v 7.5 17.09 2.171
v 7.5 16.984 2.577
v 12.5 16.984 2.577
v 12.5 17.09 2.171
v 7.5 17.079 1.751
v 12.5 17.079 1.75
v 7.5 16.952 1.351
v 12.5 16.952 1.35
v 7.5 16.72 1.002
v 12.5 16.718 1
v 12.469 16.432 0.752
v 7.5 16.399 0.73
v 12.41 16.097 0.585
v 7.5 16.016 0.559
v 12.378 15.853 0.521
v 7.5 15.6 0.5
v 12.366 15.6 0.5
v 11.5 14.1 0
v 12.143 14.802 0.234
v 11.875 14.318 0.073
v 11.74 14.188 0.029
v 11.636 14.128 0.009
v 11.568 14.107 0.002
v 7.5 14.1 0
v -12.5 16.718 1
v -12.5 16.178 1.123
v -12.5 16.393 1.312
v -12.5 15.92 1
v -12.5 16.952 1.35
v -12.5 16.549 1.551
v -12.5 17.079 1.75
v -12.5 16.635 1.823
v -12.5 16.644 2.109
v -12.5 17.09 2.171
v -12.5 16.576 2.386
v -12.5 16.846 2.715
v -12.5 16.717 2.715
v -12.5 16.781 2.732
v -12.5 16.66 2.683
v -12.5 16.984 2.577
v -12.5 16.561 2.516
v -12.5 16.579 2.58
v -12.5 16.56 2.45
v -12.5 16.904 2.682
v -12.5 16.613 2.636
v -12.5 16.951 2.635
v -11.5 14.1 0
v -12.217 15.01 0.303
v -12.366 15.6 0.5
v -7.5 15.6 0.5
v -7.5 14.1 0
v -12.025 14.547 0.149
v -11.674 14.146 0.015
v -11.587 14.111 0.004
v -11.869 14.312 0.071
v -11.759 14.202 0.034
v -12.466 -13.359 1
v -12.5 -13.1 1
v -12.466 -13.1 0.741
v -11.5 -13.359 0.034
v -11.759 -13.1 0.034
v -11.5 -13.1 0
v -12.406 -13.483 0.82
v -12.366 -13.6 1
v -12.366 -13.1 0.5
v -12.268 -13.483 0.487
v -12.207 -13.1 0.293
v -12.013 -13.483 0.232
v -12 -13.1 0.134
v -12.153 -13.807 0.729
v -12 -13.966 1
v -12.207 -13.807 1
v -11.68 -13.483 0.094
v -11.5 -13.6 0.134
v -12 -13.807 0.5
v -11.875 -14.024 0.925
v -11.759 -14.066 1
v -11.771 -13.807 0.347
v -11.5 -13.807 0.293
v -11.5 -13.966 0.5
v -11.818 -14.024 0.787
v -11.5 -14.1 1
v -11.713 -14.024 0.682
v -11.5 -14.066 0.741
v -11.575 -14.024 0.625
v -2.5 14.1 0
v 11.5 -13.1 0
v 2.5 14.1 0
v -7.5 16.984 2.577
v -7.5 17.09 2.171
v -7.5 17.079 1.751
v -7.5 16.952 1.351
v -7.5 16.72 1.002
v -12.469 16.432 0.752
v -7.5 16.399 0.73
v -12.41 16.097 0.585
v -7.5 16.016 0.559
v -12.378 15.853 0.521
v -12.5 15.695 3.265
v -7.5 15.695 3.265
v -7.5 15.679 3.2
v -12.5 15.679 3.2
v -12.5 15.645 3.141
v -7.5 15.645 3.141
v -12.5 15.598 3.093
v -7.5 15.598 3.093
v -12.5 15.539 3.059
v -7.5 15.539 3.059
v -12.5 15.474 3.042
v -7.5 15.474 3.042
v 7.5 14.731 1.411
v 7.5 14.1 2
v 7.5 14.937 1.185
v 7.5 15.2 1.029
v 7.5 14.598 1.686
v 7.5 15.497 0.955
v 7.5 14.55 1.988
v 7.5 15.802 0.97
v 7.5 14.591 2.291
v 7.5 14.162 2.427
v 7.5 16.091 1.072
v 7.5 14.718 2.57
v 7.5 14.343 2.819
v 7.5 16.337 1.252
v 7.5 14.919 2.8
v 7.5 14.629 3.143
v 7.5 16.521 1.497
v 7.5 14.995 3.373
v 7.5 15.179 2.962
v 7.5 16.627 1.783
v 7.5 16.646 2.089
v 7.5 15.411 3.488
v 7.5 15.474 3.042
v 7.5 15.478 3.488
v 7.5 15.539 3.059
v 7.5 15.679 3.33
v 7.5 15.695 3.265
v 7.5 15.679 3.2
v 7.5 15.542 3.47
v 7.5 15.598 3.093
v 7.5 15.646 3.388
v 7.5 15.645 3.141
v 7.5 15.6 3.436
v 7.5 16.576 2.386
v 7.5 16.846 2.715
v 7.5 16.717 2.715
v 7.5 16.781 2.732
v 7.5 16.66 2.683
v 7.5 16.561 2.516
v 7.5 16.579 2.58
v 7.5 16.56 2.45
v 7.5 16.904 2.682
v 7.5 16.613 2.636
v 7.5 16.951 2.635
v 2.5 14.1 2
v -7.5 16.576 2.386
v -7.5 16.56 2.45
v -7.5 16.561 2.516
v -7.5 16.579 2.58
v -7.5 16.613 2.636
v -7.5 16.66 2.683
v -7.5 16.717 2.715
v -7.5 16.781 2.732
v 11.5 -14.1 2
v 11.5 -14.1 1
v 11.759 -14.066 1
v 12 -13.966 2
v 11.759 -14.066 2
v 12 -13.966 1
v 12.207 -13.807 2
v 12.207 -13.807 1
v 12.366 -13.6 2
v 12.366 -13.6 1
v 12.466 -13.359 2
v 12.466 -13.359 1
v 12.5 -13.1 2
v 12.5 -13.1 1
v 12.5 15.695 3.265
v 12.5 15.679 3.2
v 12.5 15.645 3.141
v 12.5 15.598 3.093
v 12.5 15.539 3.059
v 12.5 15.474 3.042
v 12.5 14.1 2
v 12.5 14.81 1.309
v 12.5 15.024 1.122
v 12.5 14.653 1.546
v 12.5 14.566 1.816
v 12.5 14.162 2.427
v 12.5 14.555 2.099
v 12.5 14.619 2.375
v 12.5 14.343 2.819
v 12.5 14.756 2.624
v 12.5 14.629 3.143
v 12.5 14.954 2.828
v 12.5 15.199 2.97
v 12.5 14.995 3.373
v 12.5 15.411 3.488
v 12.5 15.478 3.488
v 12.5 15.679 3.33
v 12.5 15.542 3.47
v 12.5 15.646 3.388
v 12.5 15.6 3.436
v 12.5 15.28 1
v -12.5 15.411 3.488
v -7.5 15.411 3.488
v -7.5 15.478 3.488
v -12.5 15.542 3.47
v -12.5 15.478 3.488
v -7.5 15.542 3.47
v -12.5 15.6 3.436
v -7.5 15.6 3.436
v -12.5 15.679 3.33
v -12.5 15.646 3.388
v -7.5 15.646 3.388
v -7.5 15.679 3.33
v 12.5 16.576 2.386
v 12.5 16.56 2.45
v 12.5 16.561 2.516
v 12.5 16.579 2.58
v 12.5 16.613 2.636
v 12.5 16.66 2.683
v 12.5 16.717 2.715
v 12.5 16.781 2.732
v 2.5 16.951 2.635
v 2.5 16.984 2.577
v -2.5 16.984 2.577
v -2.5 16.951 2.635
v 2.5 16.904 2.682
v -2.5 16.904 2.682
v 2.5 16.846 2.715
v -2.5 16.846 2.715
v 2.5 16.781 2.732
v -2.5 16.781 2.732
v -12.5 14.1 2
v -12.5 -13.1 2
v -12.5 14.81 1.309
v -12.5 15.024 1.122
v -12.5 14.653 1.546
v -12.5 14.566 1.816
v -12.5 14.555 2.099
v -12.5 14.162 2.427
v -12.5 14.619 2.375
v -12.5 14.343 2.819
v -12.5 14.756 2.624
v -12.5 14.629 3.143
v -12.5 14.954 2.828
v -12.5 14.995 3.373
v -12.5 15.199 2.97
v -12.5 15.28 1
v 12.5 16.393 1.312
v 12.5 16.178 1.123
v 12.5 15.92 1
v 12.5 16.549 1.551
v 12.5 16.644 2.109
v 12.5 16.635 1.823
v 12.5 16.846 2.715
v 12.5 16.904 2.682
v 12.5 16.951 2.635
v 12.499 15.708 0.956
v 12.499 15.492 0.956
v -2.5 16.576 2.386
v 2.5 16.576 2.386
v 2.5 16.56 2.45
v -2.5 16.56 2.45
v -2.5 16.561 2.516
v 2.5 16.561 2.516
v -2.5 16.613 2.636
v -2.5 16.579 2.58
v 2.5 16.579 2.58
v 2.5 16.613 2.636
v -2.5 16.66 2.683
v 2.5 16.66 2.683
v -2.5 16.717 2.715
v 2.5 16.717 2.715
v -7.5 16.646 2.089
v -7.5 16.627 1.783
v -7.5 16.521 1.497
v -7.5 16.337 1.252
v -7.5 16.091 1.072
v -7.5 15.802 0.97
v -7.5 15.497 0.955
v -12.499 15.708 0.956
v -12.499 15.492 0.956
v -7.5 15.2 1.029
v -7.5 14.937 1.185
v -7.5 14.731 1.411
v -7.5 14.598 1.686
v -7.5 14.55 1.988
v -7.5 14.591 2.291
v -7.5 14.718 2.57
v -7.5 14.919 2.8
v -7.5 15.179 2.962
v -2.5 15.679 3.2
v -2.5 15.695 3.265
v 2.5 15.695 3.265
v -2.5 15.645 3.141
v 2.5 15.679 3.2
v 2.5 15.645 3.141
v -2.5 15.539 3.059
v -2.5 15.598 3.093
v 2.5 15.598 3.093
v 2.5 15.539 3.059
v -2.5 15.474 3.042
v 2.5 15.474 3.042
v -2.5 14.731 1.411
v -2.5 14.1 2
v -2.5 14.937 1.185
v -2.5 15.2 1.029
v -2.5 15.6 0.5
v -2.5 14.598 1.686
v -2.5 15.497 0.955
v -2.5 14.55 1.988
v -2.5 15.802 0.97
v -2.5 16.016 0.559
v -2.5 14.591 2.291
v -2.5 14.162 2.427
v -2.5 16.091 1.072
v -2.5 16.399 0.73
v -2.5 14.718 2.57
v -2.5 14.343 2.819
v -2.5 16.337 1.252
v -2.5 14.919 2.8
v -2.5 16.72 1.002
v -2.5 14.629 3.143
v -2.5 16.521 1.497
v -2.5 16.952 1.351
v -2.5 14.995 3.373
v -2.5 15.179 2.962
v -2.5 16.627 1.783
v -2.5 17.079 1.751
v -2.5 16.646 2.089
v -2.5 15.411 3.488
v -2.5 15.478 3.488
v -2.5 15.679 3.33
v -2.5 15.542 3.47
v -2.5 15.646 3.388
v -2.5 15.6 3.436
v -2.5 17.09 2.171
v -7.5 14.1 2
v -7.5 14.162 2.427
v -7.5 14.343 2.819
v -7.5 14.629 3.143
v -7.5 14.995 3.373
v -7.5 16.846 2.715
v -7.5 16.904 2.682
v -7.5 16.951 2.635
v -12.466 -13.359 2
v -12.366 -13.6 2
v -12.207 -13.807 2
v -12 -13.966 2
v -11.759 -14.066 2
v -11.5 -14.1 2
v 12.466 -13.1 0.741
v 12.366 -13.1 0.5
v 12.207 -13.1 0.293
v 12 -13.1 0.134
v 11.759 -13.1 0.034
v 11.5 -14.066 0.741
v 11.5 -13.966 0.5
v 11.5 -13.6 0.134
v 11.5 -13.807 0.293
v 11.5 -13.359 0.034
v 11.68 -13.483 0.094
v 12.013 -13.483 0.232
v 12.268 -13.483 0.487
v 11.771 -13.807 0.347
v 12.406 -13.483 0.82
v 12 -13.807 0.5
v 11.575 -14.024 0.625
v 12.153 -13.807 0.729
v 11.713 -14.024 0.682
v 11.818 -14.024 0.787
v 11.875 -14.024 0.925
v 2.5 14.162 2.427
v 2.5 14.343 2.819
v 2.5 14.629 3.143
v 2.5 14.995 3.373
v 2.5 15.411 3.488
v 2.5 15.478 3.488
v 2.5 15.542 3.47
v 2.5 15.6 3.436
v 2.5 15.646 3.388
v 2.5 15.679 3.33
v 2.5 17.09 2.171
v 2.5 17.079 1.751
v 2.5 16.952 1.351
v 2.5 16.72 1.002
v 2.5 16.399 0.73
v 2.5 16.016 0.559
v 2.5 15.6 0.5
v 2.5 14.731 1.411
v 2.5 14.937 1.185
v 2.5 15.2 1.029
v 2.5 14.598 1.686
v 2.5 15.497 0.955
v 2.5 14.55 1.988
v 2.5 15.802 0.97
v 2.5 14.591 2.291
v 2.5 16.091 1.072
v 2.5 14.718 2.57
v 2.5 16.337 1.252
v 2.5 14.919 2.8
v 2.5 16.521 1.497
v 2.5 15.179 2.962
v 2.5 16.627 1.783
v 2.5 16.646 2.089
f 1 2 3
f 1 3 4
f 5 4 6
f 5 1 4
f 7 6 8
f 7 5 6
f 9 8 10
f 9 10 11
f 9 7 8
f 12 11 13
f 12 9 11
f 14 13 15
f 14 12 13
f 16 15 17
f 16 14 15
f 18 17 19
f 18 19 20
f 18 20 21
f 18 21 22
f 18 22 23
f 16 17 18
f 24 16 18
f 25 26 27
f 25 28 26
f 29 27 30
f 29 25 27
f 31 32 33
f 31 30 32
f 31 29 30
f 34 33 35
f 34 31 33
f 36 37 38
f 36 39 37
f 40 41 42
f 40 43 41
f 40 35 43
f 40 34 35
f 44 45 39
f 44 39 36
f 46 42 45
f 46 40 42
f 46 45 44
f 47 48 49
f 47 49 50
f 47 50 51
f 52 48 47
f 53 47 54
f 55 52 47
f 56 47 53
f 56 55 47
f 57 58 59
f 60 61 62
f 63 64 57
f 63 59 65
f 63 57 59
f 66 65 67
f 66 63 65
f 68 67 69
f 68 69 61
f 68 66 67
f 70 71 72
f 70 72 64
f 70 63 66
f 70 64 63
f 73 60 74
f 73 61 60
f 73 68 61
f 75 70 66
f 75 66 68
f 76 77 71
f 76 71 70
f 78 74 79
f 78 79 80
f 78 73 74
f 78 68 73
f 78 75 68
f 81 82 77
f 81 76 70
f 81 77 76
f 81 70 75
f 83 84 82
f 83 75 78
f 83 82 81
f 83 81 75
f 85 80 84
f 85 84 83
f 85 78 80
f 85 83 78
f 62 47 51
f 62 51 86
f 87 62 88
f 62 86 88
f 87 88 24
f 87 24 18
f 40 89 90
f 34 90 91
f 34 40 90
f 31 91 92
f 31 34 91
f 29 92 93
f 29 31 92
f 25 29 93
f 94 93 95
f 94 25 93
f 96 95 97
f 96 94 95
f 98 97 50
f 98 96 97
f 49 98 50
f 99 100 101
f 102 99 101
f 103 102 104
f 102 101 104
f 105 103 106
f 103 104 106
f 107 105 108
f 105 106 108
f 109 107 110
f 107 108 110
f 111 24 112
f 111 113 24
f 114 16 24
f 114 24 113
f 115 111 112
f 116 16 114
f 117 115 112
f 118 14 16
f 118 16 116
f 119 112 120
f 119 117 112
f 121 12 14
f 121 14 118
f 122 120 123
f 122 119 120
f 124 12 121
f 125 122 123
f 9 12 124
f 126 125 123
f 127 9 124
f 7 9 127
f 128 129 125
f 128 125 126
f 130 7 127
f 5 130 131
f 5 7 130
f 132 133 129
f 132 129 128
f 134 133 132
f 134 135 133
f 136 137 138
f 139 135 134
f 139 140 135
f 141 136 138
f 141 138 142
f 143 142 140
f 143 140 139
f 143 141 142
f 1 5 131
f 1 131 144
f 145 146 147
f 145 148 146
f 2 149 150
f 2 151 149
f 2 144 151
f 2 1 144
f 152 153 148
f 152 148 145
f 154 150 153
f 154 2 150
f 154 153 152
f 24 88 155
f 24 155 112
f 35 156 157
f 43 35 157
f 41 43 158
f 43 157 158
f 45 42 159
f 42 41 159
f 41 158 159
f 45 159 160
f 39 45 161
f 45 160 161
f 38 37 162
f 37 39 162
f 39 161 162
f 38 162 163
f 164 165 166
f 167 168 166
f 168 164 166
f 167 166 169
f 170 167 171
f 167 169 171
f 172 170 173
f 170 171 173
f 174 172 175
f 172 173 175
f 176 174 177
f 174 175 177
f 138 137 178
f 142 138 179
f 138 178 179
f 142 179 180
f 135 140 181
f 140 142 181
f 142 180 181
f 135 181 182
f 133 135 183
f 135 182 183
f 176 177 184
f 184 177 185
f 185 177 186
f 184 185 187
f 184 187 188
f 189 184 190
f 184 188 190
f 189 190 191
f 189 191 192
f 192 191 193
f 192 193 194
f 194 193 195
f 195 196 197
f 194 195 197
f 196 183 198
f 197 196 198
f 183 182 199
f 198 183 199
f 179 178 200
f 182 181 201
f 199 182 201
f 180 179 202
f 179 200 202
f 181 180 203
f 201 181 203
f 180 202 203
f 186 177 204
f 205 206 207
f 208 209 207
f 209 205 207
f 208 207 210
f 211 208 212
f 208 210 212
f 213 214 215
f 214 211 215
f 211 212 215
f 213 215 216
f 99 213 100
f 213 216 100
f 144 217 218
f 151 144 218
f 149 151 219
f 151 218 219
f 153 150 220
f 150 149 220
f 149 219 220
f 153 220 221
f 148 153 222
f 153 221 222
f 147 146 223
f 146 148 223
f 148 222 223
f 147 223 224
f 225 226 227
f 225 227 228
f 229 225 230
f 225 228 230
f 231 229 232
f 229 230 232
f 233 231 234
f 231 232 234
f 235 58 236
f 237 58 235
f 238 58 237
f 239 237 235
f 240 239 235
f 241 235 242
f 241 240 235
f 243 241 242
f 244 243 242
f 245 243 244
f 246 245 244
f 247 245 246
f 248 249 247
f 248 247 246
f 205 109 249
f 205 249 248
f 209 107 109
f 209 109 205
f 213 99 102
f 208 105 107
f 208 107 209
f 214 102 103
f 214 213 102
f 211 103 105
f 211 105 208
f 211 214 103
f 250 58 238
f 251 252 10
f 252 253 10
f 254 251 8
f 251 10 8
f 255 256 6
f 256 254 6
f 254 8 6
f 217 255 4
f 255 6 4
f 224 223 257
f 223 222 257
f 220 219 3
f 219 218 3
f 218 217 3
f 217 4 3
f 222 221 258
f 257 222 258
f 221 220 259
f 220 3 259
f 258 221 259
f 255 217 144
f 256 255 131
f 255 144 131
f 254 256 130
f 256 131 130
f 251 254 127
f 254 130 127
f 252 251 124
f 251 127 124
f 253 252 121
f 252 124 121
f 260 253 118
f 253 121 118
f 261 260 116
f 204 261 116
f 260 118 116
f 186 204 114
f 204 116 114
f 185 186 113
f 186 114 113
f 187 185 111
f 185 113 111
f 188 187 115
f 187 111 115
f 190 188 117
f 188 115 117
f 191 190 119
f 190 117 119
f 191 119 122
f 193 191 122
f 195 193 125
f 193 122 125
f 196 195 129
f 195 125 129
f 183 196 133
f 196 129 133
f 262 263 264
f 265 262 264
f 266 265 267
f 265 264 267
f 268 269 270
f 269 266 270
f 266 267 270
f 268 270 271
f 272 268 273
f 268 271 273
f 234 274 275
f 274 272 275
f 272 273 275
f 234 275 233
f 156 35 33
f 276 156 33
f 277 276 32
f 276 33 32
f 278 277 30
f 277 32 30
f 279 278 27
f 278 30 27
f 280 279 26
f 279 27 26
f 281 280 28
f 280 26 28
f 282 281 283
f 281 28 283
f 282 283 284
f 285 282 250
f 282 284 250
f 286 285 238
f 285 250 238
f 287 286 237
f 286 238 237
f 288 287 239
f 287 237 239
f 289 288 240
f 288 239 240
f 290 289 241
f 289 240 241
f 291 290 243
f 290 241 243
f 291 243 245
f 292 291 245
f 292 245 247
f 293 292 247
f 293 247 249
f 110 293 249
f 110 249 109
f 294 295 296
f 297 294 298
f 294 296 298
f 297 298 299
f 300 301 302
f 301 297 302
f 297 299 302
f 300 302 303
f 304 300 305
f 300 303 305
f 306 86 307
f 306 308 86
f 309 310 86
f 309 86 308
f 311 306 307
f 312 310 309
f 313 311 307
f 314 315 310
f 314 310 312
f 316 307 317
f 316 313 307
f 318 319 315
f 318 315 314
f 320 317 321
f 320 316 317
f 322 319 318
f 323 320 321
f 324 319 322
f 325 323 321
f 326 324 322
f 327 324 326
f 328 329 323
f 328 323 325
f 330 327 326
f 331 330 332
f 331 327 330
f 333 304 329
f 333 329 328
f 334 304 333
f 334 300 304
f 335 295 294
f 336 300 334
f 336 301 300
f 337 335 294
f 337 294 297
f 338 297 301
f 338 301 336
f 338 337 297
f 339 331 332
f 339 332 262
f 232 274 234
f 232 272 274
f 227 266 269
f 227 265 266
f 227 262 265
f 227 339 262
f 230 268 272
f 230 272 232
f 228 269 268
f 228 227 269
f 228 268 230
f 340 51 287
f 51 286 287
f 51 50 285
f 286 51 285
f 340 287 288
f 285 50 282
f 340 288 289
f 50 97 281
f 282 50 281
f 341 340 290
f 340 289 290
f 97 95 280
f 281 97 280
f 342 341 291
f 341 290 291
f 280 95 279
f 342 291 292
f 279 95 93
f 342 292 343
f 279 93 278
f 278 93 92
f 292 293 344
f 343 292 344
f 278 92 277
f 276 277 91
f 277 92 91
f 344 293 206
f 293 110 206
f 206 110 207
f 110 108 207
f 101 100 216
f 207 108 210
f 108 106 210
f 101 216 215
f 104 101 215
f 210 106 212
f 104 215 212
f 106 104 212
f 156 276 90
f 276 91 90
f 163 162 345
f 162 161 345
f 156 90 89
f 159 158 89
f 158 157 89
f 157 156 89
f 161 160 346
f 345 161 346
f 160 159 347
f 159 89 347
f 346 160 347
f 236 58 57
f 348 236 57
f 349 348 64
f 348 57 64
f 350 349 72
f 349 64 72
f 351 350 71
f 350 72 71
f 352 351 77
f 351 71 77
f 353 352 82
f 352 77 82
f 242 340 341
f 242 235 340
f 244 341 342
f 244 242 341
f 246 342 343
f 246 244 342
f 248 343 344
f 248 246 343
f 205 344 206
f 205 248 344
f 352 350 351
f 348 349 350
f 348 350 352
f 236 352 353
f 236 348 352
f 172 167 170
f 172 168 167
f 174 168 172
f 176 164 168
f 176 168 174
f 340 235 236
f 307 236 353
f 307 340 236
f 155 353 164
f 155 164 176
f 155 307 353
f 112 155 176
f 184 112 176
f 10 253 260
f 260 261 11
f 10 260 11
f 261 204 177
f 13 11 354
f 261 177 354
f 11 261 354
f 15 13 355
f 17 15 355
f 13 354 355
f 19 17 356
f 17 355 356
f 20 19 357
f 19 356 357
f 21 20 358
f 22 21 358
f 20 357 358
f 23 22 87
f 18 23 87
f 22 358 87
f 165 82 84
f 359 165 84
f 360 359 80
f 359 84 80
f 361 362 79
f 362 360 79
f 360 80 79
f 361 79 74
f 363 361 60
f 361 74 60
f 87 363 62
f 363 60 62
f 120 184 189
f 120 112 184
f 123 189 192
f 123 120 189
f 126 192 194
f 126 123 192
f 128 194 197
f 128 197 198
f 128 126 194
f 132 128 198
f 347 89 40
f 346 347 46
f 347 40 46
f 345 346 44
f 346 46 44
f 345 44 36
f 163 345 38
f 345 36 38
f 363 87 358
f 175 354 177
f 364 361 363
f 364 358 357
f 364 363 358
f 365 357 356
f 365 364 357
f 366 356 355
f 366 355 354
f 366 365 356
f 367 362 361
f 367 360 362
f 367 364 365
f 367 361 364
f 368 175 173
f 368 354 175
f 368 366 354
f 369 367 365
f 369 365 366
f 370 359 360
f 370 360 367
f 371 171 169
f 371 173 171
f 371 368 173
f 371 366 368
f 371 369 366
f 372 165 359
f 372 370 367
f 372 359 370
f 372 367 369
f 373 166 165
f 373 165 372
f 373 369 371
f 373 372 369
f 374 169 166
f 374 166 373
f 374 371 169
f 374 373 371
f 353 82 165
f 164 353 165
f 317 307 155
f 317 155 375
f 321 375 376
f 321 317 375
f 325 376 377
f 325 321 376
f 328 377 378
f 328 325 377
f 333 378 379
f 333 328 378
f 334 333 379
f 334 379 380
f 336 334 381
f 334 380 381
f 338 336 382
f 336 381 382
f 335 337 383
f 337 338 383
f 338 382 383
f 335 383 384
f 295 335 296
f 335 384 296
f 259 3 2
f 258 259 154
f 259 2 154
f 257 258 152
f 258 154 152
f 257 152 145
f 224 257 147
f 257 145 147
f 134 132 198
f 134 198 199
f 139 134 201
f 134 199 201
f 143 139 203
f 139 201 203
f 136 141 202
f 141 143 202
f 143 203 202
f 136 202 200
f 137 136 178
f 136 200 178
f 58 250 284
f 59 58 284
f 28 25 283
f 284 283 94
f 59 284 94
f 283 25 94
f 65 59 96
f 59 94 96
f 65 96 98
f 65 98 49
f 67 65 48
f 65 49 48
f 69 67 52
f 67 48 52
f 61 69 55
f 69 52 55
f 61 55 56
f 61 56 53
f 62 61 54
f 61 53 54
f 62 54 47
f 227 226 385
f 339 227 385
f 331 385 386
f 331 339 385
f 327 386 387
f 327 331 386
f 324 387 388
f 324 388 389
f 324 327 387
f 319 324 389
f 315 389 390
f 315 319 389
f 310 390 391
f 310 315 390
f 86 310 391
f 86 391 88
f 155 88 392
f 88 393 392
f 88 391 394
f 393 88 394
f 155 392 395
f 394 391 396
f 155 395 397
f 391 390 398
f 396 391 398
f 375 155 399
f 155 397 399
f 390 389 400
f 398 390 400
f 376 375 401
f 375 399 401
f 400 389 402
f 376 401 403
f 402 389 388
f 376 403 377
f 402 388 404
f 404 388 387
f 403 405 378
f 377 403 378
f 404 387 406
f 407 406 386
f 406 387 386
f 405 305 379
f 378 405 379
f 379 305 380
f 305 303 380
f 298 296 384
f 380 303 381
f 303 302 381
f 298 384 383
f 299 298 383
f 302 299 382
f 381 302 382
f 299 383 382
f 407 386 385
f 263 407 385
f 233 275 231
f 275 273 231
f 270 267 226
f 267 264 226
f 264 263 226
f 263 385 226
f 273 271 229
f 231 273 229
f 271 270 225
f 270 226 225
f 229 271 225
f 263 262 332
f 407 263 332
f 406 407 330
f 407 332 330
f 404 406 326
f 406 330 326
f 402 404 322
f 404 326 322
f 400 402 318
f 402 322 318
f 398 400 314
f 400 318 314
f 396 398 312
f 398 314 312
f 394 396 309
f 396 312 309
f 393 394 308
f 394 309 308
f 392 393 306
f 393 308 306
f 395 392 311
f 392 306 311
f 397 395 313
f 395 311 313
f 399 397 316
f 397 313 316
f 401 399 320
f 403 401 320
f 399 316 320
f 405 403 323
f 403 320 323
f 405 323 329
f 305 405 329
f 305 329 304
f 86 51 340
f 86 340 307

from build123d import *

# Parameters (mm, degrees)
SKETCH1_W           = 25
SKETCH1_H           = 28.2
BOSS_EXTRUDE1_DEPTH = 2
BOSS_EXTRUDE2_DEPTH = 5
LPATTERN1_COUNT     = 3
LPATTERN1_PITCH     = 10
SKETCH6_R           = 1.050000034
CUT_EXTRUDE1_DEPTH  = 31.490326335
FILLET1_R           = 1
FILLET2_R           = 1
SKETCH7_W           = 1.937328833
SKETCH7_H           = 1.211322367
CUT_EXTRUDE2_DEPTH  = 31.490326484
FILLET7_R           = 0.254


with BuildPart() as part:
    # Sketch1 → Boss-Extrude1 (new body)
    with BuildSketch(Plane.XY):
        Rectangle(SKETCH1_W, SKETCH1_H)
    extrude(amount=BOSS_EXTRUDE1_DEPTH)

    # Sketch5 → Boss-Extrude2 (add)
    with BuildSketch(Plane.ZY.offset(12.5)):
        with BuildLine():
            Line((0.5, 15.6), (0, 14.1))
            Line((0, 14.1), (2, 14.1))
            ThreePointArc((2, 14.1), (3.060660172, 16.660660172), (0.5, 15.6))
        make_face()
    boss_extrude2 = extrude(amount=-BOSS_EXTRUDE2_DEPTH)

    # LPattern1: Boss-Extrude2 ×3
    with Locations(*[(i * LPATTERN1_PITCH, 0, 0) for i in range(1, LPATTERN1_COUNT)]):
        add(boss_extrude2)

    # Sketch6 → Cut-Extrude1 (cut, through all)
    with BuildSketch(Plane.ZY.offset(12.5)):
        with Locations((2, 15.6)):
            Circle(SKETCH6_R)
    extrude(amount=-CUT_EXTRUDE1_DEPTH, mode=Mode.SUBTRACT)

    # Fillet1
    # the kernel refuses this fillet: 1 mm, written as the material it takes off along each edge
    with BuildSketch(Plane(origin=(12.5, -20.1, 0), x_dir=(0, 0, 1), z_dir=(0, 1, 0)), Plane(origin=(-12.5, 20.1, 0), x_dir=(0, 0, 1), z_dir=(0, -1, 0))) as fillet1_piece_1:
        with BuildLine():
            CenterArc((FILLET1_R, -FILLET1_R), FILLET1_R, 90, 90)
            Line((0, -FILLET1_R), (-FILLET1_R * 0.02, -FILLET1_R))
            Line((-FILLET1_R * 0.02, -FILLET1_R), (-FILLET1_R * 0.02, FILLET1_R * 0.02))
            Line((-FILLET1_R * 0.02, FILLET1_R * 0.02), (FILLET1_R, FILLET1_R * 0.02))
            Line((FILLET1_R, FILLET1_R * 0.02), (FILLET1_R, 0))
        make_face()
    extrude(amount=40.2, mode=Mode.SUBTRACT)
    with BuildSketch(Plane(origin=(-18.5, -14.1, 0), x_dir=(0, 0, 1), z_dir=(1, 0, 0))) as fillet1_piece_2:
        with BuildLine():
            CenterArc((FILLET1_R, -FILLET1_R), FILLET1_R, 90, 90)
            Line((0, -FILLET1_R), (-FILLET1_R * 0.02, -FILLET1_R))
            Line((-FILLET1_R * 0.02, -FILLET1_R), (-FILLET1_R * 0.02, FILLET1_R * 0.02))
            Line((-FILLET1_R * 0.02, FILLET1_R * 0.02), (FILLET1_R, FILLET1_R * 0.02))
            Line((FILLET1_R, FILLET1_R * 0.02), (FILLET1_R, 0))
        make_face()
    extrude(amount=37, mode=Mode.SUBTRACT)

    # Fillet2
    # the kernel refuses this fillet: 1 mm, written as the material it takes off along each edge
    with BuildSketch(Plane(origin=(-11.5, -13.1, 1), x_dir=(-1, 0, 0), z_dir=(0, -1, 0))) as fillet2_piece_1_section:
        Polygon((0, 0), (FILLET2_R, 0), (FILLET2_R, FILLET2_R), (0, FILLET2_R), align=None)
    fillet2_piece_1 = extrude(amount=FILLET2_R, mode=Mode.PRIVATE)
    fillet2_piece_1 = fillet2_piece_1 - Plane(origin=(-11.5, -13.1, 1), x_dir=(0.7071067811865475, 0, 0.7071067811865475), z_dir=(0, -1, 0)) * Sphere(FILLET2_R, mode=Mode.PRIVATE)
    add(fillet2_piece_1, mode=Mode.SUBTRACT)
    with BuildSketch(Plane(origin=(11.5, -13.1, 1), x_dir=(1, 0, 0), z_dir=(0, -1, 0))) as fillet2_piece_2_section:
        Polygon((0, 0), (FILLET2_R, 0), (FILLET2_R, -FILLET2_R), (0, -FILLET2_R), align=None)
    fillet2_piece_2 = extrude(amount=FILLET2_R, mode=Mode.PRIVATE)
    fillet2_piece_2 = fillet2_piece_2 - Plane(origin=(11.5, -13.1, 1), x_dir=(-0.7071067811865475, 0, 0.7071067811865475), z_dir=(0, -1, 0)) * Sphere(FILLET2_R, mode=Mode.PRIVATE)
    add(fillet2_piece_2, mode=Mode.SUBTRACT)
    with BuildSketch(Plane(origin=(12.5, -14.1, 1), x_dir=(-1, 0, 0), z_dir=(0, 0, 1))) as fillet2_piece_3:
        with BuildLine():
            CenterArc((FILLET2_R, -FILLET2_R), FILLET2_R, 90, 90)
            Line((0, -FILLET2_R), (0, 0))
            Line((0, 0), (FILLET2_R, 0))
        make_face()
    extrude(amount=3.5, mode=Mode.SUBTRACT)
    with BuildSketch(Plane(origin=(-12.5, -14.1, 1), x_dir=(1, 0, 0), z_dir=(0, 0, 1))) as fillet2_piece_4:
        with BuildLine():
            CenterArc((FILLET2_R, FILLET2_R), FILLET2_R, 180, 90)
            Line((0, FILLET2_R), (0, 0))
            Line((0, 0), (FILLET2_R, 0))
        make_face()
    extrude(amount=3.5, mode=Mode.SUBTRACT)

    # Sketch7 → Cut-Extrude2 (cut, through all)
    with BuildSketch(Plane.ZY.offset(12.5)):
        with Locations((3.702300239, 16.302688342)):
            Rectangle(SKETCH7_W, SKETCH7_H)
    extrude(amount=-CUT_EXTRUDE2_DEPTH, mode=Mode.SUBTRACT)

    # Fillet7
    # the kernel refuses this fillet: 0.254 mm, written as the material it takes off along each edge
    with BuildSketch(Plane(origin=(-6.784662672, 15.697027158, 3.496858621), x_dir=(0, -0.999525916105083, -0.03078868354273752), z_dir=(-1, 0, 0))) as fillet7_piece_1:
        with BuildLine():
            CenterArc((0.26190884, -0.252842039), FILLET7_R, 84.526905726, 97.237434721)
            Line((0.008029258, -0.260662364), (0, 0))
            ThreePointArc((0, 0), (0.143067466, 0.006838354), (0.286134931, 0))
        make_face()
    extrude(amount=6.430674656, mode=Mode.SUBTRACT)
    with BuildSketch(Plane(origin=(-6.877474788, 15.697027158, 3.045507437), x_dir=(0, 0, 1), z_dir=(-1, 0, 0))) as fillet7_piece_2:
        with BuildLine():
            CenterArc((0.249010085, -0.254), FILLET7_R, 90, 83.086084758)
            ThreePointArc((-0.003142862, -0.223424002), (0.004388728, -0.111795842), (0, 0))
            Line((0, 0), (0.249010085, 0))
        make_face()
    extrude(amount=6.245050424, mode=Mode.SUBTRACT)
    with BuildSketch(Plane(origin=(-6.34649613, 16.351184765, 2.733635822), x_dir=(0, 1, 0), z_dir=(-1, 0, 0)), Plane(origin=(13.65350387, 16.351184765, 2.733635822), x_dir=(0, 1, 0), z_dir=(-1, 0, 0)), Plane(origin=(3.65350387, 16.351184765, 2.733635822), x_dir=(0, 1, 0), z_dir=(-1, 0, 0))) as fillet7_piece_3:
        with BuildLine():
            CenterArc((0.461401548, 0.254), FILLET7_R, 158.418835743, 111.581164257)
            ThreePointArc((0.225207594, 0.347425994), (0.129898026, 0.162502575), (0, 0))
            Line((0, 0), (0.461401548, 0))
        make_face()
    extrude(amount=7.30700774, mode=Mode.SUBTRACT)
    with BuildSketch(Plane(origin=(-12.934394729, 16.908349525, 2.733635822), x_dir=(0, -1, 0), z_dir=(1, 0, 0)), Plane(origin=(7.065605271, 16.908349525, 2.733635822), x_dir=(0, -1, 0), z_dir=(1, 0, 0)), Plane(origin=(-2.934394729, 16.908349525, 2.733635822), x_dir=(0, -1, 0), z_dir=(1, 0, 0))) as fillet7_piece_4:
        with BuildLine():
            CenterArc((0.158364535, 0.254), FILLET7_R, 202.640044459, 67.359955541)
            ThreePointArc((-0.076062582, 0.156225121), (-0.040295304, 0.077010263), (0, 0))
            Line((0, 0), (0.158364535, 0))
        make_face()
    extrude(amount=5.868789458, mode=Mode.SUBTRACT)
    with BuildSketch(Plane(origin=(13.215337328, 15.697027158, 3.496858621), x_dir=(0, 0, -1), z_dir=(-1, 0, 0)), Plane(origin=(3.215337328, 15.697027158, 3.496858621), x_dir=(0, 0, -1), z_dir=(-1, 0, 0))) as fillet7_piece_5:
        with BuildLine():
            CenterArc((0.260785999, 0.254), FILLET7_R, 172.762565279, 97.237434721)
            ThreePointArc((0.008809718, 0.285999279), (-0.002430253, 0.143210184), (0, 0))
            Line((0, 0), (0.260785999, 0))
        make_face()
    extrude(amount=6.430674656, mode=Mode.SUBTRACT)
    with BuildSketch(Plane(origin=(13.122525212, 15.697027158, 3.045507437), x_dir=(0, -0.999901077195103, -0.014065412332113414), z_dir=(-1, 0, 0)), Plane(origin=(3.122525212, 15.697027158, 3.045507437), x_dir=(0, -0.999901077195103, -0.014065412332113414), z_dir=(-1, 0, 0))) as fillet7_piece_6:
        with BuildLine():
            CenterArc((0.250472444, 0.252558067), FILLET7_R, 180.805915338, 83.086084758)
            Line((-0.00350243, 0.248985452), (0, 0))
            ThreePointArc((0, 0), (0.111723053, 0.005960748), (0.223446106, 0))
        make_face()
    extrude(amount=6.245050424, mode=Mode.SUBTRACT)


solid = part.part
